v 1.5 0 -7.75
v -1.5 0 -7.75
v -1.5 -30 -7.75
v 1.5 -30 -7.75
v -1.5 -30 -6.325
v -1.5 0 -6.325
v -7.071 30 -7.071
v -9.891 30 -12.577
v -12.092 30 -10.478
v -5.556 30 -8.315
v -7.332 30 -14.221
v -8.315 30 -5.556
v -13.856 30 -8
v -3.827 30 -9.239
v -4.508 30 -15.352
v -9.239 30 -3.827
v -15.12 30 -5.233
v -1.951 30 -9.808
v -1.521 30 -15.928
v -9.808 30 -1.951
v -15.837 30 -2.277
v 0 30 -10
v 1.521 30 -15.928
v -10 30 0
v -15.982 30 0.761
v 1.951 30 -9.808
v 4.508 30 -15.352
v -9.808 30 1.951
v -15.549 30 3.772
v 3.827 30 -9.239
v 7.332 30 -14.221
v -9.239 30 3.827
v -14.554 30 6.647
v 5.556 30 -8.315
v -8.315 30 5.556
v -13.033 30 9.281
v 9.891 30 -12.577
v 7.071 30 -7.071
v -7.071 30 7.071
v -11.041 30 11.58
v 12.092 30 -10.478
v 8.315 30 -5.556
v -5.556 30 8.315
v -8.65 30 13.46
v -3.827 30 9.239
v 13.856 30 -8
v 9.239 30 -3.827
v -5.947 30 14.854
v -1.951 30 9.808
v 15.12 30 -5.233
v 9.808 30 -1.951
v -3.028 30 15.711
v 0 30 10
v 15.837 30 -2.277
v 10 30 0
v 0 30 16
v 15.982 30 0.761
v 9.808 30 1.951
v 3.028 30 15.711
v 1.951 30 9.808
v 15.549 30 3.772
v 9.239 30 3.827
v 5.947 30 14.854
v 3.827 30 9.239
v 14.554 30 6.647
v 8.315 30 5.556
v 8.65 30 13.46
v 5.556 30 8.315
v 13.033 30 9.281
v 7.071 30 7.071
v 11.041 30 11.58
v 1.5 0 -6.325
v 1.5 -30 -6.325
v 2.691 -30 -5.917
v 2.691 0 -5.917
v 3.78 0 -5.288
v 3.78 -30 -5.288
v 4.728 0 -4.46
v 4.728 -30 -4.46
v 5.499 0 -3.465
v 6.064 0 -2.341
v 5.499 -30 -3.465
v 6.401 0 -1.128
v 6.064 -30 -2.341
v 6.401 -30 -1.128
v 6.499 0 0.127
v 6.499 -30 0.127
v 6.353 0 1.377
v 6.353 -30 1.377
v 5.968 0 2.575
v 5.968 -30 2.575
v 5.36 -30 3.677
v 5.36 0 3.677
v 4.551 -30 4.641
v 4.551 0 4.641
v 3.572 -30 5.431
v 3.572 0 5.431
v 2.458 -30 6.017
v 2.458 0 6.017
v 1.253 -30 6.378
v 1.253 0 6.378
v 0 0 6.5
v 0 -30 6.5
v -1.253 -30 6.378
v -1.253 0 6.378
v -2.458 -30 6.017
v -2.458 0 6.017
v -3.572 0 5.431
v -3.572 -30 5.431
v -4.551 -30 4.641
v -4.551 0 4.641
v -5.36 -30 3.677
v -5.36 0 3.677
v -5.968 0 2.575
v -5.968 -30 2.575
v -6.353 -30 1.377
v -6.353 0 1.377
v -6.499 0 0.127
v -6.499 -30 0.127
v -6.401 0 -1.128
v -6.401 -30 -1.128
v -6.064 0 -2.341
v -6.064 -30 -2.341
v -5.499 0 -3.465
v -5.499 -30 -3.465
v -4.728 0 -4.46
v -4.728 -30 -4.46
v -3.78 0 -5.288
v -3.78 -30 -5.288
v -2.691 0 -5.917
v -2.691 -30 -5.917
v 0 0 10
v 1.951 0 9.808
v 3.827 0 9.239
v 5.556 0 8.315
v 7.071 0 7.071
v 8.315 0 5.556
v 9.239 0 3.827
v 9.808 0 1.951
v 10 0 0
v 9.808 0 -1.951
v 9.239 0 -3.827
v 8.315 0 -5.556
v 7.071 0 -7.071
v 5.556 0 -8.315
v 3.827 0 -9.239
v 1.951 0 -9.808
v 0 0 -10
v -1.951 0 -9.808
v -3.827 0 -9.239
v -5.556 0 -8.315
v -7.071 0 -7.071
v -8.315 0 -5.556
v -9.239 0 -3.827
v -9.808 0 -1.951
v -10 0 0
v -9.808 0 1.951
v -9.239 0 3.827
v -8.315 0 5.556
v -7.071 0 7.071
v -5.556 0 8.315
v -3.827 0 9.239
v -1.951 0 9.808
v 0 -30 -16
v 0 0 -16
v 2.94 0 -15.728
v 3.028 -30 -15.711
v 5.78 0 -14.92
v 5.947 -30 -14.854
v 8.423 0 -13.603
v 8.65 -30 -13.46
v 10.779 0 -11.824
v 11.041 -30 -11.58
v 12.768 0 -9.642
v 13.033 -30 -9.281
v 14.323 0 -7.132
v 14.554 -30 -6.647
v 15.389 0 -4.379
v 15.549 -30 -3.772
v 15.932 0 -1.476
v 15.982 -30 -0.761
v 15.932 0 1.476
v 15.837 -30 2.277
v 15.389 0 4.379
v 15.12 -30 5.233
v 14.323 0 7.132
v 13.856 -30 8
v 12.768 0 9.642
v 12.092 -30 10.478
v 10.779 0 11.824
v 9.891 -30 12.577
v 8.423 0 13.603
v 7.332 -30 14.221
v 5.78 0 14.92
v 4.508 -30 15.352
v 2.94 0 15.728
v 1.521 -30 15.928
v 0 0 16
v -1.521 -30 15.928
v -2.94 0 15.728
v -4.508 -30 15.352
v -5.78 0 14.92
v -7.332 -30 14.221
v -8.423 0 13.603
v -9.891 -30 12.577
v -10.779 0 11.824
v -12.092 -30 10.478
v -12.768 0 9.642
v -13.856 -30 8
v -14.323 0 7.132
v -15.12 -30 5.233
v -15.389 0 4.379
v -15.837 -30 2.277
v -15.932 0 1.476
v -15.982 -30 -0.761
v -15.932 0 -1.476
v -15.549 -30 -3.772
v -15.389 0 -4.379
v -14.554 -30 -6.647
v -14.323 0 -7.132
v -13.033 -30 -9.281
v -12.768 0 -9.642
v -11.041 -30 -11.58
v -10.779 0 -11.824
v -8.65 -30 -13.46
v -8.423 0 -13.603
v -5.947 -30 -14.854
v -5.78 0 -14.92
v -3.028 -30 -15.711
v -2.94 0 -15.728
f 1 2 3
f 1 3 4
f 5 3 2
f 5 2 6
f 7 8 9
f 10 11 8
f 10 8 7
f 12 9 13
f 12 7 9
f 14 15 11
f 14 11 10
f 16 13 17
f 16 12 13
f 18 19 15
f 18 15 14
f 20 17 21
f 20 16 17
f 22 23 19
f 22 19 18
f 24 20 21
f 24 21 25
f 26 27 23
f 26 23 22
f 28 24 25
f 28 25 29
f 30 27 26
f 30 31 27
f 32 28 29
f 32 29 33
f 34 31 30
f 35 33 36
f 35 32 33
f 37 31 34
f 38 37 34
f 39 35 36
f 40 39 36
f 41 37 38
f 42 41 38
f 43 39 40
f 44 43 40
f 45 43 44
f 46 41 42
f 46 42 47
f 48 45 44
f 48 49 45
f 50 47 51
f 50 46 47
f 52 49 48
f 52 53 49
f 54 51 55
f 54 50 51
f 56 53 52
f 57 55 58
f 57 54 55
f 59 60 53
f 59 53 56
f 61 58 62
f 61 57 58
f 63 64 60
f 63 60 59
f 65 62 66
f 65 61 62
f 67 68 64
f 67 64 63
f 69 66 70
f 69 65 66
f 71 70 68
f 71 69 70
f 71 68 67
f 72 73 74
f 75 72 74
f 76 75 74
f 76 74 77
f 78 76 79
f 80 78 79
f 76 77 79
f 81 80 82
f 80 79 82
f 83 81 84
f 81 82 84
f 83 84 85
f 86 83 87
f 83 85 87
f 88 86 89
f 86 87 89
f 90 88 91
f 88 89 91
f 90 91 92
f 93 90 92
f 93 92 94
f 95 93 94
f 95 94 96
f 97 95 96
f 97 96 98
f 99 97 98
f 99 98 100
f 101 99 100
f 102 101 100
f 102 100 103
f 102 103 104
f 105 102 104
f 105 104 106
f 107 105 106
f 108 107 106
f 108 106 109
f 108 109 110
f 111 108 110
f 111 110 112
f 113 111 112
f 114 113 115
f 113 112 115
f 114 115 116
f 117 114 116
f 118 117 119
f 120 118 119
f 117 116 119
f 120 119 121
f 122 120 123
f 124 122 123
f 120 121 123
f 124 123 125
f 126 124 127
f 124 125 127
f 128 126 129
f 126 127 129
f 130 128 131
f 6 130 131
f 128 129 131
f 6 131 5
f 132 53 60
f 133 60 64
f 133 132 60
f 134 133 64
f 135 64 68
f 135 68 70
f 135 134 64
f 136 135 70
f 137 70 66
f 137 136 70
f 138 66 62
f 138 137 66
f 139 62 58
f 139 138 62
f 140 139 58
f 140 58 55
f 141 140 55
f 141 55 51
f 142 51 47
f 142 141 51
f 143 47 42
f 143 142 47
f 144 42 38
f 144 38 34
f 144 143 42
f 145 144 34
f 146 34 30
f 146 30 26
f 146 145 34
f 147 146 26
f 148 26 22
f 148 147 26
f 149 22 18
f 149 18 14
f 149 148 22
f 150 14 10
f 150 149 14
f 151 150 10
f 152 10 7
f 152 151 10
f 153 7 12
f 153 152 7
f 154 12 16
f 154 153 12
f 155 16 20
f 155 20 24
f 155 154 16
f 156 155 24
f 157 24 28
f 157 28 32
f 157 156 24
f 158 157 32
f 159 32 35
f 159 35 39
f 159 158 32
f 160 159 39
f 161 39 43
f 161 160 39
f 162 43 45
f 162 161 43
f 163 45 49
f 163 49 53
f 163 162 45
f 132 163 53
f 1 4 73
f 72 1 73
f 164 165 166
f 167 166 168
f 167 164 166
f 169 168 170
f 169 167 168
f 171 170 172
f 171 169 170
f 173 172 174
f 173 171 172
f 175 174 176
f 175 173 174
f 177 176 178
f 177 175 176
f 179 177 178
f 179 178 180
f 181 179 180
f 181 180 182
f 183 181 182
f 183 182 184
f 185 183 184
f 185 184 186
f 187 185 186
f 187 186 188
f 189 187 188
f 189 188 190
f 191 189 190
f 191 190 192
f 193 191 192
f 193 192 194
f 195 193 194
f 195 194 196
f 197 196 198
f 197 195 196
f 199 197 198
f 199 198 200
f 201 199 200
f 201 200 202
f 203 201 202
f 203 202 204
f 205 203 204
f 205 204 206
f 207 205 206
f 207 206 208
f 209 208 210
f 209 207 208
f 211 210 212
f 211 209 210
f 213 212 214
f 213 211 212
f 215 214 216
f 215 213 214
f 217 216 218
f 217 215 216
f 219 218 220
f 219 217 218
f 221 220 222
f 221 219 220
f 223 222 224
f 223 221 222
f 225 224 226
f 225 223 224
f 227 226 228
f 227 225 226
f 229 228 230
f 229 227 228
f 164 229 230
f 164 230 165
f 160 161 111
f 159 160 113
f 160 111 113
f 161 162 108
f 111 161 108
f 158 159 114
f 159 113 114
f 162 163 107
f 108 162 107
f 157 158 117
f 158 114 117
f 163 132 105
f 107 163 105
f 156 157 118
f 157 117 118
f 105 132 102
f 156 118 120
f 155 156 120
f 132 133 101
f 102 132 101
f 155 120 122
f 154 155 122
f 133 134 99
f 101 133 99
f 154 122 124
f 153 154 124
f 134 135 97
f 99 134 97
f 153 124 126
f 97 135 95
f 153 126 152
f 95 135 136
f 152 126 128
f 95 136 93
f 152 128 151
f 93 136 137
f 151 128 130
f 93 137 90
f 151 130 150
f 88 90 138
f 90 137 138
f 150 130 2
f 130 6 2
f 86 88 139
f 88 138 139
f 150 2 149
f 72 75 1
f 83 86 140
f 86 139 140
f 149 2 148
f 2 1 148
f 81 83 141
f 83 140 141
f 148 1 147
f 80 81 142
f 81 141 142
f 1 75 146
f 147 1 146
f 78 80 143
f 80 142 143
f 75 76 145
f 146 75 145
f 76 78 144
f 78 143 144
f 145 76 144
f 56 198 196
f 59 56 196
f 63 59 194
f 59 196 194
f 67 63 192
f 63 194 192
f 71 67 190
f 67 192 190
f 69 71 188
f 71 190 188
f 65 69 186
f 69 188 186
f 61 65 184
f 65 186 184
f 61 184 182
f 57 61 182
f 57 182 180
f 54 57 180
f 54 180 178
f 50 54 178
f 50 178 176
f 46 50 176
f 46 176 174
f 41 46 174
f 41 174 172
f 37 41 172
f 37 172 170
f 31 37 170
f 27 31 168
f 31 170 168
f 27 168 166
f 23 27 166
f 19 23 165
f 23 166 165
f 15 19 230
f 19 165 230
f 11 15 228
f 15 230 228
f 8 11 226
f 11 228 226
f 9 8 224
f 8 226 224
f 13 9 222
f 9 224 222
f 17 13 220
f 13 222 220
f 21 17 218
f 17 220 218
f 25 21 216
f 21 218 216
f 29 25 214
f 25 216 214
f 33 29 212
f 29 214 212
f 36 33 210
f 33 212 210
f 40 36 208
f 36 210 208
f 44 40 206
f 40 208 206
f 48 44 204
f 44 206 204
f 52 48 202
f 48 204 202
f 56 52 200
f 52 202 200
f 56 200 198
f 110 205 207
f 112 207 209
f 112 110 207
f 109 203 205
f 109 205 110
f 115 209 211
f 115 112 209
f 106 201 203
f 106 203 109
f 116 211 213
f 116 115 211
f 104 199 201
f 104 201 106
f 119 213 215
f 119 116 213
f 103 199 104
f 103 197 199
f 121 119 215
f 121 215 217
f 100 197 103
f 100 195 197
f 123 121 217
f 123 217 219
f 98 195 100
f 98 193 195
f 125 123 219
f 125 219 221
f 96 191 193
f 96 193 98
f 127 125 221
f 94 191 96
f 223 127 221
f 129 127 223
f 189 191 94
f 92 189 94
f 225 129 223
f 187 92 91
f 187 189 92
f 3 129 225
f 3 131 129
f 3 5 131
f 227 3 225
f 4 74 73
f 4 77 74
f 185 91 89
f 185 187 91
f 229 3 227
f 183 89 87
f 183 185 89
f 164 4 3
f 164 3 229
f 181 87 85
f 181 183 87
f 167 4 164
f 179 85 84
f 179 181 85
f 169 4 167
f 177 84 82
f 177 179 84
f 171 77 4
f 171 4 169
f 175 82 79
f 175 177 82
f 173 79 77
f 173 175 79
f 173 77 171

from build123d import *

# Parameters (mm, degrees)
SKETCH1_R           = 16
SKETCH1_R_2         = 10
BOSS_EXTRUDE1_DEPTH = 30
BOSS_EXTRUDE2_START = 30
SKETCH2_R           = 16
BOSS_EXTRUDE2_DEPTH = 30
SKETCH3_R           = 6.5
CUT_EXTRUDE1_DEPTH  = 30
SKETCH4_W           = 3
SKETCH4_H           = 2.5
CUT_EXTRUDE2_DEPTH  = 30


with BuildPart() as part:
    # Sketch1 → Boss-Extrude1 (new body)
    with BuildSketch(Plane(origin=(0, 0, 0), x_dir=(1, 0, 0), z_dir=(0, 1, 0))):
        with Locations(Location((0, 0, 0), (0, 0, 270))):
            Circle(SKETCH1_R)
        with Locations(Location((0, 0, 0), (0, 0, 270))):
            Circle(SKETCH1_R_2, mode=Mode.SUBTRACT)
    extrude(amount=BOSS_EXTRUDE1_DEPTH)

    # Sketch2 → Boss-Extrude2 (add)
    with BuildSketch(Plane.XZ.offset(BOSS_EXTRUDE2_START)):
        with Locations(Location((0, 0, 0), (0, 0, 270))):
            Circle(SKETCH2_R)
    extrude(amount=-BOSS_EXTRUDE2_DEPTH)

    # Sketch3 → Cut-Extrude1 (cut)
    with BuildSketch(Plane.XZ.offset(30)):
        with Locations(Location((0, 0, 0), (0, 0, 270))):
            Circle(SKETCH3_R)
    extrude(amount=-CUT_EXTRUDE1_DEPTH, mode=Mode.SUBTRACT)

    # Sketch4 → Cut-Extrude2 (cut)
    with BuildSketch(Plane.XZ.offset(30)):
        with Locations((0, -6.5)):
            Rectangle(SKETCH4_W, SKETCH4_H)
    extrude(amount=-CUT_EXTRUDE2_DEPTH, mode=Mode.SUBTRACT)


solid = part.part
